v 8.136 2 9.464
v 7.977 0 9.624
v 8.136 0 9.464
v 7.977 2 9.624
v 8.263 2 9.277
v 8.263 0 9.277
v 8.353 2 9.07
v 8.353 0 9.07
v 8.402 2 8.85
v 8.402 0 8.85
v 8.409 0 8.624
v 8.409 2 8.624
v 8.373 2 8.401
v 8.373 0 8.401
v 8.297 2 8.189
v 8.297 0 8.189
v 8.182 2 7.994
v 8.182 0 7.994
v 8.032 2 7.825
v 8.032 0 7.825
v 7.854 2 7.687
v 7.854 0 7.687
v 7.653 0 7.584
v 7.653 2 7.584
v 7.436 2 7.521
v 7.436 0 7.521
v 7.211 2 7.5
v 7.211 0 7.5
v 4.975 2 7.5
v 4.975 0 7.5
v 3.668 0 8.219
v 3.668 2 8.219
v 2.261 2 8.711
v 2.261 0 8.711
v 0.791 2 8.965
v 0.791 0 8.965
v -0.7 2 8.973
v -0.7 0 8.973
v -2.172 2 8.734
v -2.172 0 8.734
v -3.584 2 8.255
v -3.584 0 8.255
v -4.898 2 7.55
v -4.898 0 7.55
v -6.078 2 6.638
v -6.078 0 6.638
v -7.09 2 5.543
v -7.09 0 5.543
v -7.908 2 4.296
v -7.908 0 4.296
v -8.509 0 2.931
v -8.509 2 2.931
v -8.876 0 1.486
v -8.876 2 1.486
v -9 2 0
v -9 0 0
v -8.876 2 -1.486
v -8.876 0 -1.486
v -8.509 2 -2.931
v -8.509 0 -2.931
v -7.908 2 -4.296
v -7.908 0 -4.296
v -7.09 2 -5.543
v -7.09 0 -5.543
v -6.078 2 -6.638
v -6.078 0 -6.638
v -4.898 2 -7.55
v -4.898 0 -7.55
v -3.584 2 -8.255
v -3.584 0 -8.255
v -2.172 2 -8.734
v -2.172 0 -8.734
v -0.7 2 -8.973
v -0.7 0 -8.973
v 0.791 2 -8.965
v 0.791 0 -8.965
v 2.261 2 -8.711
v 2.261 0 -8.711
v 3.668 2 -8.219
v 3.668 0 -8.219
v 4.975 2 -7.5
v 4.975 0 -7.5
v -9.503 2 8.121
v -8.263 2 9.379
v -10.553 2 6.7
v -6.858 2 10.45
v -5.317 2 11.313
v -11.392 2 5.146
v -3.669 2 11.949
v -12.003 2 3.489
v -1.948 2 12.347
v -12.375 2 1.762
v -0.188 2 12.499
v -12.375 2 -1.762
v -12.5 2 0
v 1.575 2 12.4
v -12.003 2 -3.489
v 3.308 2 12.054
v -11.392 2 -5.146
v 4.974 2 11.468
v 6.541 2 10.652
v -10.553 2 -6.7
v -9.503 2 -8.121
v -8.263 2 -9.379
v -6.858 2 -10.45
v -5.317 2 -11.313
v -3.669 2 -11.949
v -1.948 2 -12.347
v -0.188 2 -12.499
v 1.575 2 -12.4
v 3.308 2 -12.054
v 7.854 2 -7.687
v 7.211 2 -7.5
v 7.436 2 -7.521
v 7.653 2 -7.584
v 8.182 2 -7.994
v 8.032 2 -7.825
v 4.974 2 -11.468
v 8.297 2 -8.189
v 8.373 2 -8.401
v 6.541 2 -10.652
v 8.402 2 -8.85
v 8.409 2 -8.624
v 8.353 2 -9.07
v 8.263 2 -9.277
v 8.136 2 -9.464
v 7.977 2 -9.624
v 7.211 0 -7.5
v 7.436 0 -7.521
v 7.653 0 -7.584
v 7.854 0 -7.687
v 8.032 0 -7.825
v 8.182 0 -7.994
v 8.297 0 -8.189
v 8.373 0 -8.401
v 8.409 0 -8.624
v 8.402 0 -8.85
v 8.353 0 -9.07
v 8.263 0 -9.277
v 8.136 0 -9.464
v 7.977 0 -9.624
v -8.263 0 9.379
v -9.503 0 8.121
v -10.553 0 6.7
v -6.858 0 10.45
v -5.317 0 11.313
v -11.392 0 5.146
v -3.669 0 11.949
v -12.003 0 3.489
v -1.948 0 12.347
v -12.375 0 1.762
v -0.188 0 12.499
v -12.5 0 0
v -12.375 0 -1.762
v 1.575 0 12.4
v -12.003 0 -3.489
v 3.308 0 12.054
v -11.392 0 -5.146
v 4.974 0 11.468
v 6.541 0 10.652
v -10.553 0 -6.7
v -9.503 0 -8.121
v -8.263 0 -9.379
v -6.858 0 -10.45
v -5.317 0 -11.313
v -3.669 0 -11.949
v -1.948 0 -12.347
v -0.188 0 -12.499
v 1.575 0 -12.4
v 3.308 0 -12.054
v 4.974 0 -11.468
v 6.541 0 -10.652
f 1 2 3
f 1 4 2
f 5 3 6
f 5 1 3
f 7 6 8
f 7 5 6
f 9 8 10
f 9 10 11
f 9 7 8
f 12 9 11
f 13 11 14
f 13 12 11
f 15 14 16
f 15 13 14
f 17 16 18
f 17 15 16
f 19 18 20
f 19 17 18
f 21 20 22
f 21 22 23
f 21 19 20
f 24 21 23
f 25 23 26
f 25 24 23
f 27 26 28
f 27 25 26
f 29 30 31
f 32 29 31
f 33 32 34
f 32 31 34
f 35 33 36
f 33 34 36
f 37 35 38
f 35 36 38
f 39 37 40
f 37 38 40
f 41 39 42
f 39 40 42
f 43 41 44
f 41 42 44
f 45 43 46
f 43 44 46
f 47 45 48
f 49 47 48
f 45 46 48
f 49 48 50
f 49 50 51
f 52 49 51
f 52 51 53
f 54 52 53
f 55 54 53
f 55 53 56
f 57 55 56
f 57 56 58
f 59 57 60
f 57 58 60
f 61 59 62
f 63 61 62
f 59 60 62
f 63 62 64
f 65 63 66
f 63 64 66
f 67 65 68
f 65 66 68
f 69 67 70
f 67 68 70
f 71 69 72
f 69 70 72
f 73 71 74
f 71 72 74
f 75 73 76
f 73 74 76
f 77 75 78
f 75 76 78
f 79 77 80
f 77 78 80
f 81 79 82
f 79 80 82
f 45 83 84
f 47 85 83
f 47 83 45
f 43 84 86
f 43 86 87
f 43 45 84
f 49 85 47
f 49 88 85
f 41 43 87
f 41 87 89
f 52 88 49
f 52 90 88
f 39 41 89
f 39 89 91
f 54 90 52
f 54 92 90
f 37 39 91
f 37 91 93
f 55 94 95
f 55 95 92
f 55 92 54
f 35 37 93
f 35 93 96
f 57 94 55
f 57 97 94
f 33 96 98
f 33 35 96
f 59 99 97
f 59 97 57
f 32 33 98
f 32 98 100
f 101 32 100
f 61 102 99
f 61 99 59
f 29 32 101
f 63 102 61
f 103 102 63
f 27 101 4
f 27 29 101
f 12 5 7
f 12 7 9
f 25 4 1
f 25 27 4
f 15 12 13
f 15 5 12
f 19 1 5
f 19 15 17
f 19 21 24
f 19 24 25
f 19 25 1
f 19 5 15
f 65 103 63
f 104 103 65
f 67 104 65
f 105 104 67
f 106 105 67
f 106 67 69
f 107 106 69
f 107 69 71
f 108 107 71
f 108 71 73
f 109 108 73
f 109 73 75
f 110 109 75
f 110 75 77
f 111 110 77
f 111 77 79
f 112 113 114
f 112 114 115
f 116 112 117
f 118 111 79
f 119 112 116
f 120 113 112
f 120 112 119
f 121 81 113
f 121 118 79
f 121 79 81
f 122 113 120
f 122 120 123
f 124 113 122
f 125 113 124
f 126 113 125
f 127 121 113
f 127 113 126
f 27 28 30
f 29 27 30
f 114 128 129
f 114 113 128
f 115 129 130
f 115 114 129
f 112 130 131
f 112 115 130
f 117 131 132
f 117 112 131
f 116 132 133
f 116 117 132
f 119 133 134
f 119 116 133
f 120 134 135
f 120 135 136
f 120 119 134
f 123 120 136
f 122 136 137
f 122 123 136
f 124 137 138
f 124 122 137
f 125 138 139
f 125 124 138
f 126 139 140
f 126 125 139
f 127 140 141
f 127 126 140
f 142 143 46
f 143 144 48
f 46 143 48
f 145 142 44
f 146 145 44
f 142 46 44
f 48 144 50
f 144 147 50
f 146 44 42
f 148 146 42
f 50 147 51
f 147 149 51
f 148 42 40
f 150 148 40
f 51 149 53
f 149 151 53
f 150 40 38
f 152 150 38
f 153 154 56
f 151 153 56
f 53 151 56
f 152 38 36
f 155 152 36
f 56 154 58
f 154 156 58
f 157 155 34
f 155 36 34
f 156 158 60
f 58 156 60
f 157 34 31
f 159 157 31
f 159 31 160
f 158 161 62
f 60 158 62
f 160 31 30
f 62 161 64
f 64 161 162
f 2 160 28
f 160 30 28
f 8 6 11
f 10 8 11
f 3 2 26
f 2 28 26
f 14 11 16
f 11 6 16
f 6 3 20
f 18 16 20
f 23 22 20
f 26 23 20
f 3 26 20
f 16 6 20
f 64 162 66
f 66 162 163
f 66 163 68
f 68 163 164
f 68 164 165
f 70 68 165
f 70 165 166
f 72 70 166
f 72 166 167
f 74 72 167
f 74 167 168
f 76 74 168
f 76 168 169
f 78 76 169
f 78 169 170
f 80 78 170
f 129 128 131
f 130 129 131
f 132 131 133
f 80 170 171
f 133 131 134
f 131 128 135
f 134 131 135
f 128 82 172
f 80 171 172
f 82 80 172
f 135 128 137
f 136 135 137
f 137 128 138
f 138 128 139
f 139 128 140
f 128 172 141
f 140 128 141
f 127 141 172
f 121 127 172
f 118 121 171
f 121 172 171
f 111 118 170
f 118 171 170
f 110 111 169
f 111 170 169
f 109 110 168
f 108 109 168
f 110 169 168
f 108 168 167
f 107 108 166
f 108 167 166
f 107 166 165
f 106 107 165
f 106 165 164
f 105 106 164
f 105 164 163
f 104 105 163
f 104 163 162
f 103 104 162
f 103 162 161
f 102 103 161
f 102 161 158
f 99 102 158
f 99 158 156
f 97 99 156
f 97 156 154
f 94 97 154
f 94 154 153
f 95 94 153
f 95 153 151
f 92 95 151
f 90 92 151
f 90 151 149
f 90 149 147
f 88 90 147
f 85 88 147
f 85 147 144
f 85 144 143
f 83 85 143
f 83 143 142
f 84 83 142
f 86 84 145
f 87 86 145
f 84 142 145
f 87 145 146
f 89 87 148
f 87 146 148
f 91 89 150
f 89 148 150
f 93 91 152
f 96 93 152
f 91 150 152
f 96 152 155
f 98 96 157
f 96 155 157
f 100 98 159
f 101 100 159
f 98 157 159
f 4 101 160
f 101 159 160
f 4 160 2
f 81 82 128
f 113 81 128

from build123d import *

# Parameters (mm, degrees)
BOSS_EXTRUDE2_DEPTH = 2
FILLET1_R           = 1.2


with BuildPart() as part:
    # Sketch1 → Boss-Extrude2 (new body)
    with BuildSketch(Plane(origin=(0, 0, 0), x_dir=(1, 0, 0), z_dir=(0, 1, 0))):
        with BuildLine():
            Line((4.974937186, 7.5), (10, 7.5))
            ThreePointArc((10, 7.5), (-12.5, 0), (10, -7.5))
            Line((10, -7.5), (4.974937186, -7.5))
            ThreePointArc((4.974937186, -7.5), (-9, 0), (4.974937186, 7.5))
        make_face()
    extrude(amount=BOSS_EXTRUDE2_DEPTH)

    # Fillet1
    fillet1_edges = [part.edges().sort_by_distance(p)[0] for p in [
        (10, 1, 7.5),
        (10, 1, -7.5),
    ]]
    fillet(fillet1_edges, radius=FILLET1_R)


solid = part.part
